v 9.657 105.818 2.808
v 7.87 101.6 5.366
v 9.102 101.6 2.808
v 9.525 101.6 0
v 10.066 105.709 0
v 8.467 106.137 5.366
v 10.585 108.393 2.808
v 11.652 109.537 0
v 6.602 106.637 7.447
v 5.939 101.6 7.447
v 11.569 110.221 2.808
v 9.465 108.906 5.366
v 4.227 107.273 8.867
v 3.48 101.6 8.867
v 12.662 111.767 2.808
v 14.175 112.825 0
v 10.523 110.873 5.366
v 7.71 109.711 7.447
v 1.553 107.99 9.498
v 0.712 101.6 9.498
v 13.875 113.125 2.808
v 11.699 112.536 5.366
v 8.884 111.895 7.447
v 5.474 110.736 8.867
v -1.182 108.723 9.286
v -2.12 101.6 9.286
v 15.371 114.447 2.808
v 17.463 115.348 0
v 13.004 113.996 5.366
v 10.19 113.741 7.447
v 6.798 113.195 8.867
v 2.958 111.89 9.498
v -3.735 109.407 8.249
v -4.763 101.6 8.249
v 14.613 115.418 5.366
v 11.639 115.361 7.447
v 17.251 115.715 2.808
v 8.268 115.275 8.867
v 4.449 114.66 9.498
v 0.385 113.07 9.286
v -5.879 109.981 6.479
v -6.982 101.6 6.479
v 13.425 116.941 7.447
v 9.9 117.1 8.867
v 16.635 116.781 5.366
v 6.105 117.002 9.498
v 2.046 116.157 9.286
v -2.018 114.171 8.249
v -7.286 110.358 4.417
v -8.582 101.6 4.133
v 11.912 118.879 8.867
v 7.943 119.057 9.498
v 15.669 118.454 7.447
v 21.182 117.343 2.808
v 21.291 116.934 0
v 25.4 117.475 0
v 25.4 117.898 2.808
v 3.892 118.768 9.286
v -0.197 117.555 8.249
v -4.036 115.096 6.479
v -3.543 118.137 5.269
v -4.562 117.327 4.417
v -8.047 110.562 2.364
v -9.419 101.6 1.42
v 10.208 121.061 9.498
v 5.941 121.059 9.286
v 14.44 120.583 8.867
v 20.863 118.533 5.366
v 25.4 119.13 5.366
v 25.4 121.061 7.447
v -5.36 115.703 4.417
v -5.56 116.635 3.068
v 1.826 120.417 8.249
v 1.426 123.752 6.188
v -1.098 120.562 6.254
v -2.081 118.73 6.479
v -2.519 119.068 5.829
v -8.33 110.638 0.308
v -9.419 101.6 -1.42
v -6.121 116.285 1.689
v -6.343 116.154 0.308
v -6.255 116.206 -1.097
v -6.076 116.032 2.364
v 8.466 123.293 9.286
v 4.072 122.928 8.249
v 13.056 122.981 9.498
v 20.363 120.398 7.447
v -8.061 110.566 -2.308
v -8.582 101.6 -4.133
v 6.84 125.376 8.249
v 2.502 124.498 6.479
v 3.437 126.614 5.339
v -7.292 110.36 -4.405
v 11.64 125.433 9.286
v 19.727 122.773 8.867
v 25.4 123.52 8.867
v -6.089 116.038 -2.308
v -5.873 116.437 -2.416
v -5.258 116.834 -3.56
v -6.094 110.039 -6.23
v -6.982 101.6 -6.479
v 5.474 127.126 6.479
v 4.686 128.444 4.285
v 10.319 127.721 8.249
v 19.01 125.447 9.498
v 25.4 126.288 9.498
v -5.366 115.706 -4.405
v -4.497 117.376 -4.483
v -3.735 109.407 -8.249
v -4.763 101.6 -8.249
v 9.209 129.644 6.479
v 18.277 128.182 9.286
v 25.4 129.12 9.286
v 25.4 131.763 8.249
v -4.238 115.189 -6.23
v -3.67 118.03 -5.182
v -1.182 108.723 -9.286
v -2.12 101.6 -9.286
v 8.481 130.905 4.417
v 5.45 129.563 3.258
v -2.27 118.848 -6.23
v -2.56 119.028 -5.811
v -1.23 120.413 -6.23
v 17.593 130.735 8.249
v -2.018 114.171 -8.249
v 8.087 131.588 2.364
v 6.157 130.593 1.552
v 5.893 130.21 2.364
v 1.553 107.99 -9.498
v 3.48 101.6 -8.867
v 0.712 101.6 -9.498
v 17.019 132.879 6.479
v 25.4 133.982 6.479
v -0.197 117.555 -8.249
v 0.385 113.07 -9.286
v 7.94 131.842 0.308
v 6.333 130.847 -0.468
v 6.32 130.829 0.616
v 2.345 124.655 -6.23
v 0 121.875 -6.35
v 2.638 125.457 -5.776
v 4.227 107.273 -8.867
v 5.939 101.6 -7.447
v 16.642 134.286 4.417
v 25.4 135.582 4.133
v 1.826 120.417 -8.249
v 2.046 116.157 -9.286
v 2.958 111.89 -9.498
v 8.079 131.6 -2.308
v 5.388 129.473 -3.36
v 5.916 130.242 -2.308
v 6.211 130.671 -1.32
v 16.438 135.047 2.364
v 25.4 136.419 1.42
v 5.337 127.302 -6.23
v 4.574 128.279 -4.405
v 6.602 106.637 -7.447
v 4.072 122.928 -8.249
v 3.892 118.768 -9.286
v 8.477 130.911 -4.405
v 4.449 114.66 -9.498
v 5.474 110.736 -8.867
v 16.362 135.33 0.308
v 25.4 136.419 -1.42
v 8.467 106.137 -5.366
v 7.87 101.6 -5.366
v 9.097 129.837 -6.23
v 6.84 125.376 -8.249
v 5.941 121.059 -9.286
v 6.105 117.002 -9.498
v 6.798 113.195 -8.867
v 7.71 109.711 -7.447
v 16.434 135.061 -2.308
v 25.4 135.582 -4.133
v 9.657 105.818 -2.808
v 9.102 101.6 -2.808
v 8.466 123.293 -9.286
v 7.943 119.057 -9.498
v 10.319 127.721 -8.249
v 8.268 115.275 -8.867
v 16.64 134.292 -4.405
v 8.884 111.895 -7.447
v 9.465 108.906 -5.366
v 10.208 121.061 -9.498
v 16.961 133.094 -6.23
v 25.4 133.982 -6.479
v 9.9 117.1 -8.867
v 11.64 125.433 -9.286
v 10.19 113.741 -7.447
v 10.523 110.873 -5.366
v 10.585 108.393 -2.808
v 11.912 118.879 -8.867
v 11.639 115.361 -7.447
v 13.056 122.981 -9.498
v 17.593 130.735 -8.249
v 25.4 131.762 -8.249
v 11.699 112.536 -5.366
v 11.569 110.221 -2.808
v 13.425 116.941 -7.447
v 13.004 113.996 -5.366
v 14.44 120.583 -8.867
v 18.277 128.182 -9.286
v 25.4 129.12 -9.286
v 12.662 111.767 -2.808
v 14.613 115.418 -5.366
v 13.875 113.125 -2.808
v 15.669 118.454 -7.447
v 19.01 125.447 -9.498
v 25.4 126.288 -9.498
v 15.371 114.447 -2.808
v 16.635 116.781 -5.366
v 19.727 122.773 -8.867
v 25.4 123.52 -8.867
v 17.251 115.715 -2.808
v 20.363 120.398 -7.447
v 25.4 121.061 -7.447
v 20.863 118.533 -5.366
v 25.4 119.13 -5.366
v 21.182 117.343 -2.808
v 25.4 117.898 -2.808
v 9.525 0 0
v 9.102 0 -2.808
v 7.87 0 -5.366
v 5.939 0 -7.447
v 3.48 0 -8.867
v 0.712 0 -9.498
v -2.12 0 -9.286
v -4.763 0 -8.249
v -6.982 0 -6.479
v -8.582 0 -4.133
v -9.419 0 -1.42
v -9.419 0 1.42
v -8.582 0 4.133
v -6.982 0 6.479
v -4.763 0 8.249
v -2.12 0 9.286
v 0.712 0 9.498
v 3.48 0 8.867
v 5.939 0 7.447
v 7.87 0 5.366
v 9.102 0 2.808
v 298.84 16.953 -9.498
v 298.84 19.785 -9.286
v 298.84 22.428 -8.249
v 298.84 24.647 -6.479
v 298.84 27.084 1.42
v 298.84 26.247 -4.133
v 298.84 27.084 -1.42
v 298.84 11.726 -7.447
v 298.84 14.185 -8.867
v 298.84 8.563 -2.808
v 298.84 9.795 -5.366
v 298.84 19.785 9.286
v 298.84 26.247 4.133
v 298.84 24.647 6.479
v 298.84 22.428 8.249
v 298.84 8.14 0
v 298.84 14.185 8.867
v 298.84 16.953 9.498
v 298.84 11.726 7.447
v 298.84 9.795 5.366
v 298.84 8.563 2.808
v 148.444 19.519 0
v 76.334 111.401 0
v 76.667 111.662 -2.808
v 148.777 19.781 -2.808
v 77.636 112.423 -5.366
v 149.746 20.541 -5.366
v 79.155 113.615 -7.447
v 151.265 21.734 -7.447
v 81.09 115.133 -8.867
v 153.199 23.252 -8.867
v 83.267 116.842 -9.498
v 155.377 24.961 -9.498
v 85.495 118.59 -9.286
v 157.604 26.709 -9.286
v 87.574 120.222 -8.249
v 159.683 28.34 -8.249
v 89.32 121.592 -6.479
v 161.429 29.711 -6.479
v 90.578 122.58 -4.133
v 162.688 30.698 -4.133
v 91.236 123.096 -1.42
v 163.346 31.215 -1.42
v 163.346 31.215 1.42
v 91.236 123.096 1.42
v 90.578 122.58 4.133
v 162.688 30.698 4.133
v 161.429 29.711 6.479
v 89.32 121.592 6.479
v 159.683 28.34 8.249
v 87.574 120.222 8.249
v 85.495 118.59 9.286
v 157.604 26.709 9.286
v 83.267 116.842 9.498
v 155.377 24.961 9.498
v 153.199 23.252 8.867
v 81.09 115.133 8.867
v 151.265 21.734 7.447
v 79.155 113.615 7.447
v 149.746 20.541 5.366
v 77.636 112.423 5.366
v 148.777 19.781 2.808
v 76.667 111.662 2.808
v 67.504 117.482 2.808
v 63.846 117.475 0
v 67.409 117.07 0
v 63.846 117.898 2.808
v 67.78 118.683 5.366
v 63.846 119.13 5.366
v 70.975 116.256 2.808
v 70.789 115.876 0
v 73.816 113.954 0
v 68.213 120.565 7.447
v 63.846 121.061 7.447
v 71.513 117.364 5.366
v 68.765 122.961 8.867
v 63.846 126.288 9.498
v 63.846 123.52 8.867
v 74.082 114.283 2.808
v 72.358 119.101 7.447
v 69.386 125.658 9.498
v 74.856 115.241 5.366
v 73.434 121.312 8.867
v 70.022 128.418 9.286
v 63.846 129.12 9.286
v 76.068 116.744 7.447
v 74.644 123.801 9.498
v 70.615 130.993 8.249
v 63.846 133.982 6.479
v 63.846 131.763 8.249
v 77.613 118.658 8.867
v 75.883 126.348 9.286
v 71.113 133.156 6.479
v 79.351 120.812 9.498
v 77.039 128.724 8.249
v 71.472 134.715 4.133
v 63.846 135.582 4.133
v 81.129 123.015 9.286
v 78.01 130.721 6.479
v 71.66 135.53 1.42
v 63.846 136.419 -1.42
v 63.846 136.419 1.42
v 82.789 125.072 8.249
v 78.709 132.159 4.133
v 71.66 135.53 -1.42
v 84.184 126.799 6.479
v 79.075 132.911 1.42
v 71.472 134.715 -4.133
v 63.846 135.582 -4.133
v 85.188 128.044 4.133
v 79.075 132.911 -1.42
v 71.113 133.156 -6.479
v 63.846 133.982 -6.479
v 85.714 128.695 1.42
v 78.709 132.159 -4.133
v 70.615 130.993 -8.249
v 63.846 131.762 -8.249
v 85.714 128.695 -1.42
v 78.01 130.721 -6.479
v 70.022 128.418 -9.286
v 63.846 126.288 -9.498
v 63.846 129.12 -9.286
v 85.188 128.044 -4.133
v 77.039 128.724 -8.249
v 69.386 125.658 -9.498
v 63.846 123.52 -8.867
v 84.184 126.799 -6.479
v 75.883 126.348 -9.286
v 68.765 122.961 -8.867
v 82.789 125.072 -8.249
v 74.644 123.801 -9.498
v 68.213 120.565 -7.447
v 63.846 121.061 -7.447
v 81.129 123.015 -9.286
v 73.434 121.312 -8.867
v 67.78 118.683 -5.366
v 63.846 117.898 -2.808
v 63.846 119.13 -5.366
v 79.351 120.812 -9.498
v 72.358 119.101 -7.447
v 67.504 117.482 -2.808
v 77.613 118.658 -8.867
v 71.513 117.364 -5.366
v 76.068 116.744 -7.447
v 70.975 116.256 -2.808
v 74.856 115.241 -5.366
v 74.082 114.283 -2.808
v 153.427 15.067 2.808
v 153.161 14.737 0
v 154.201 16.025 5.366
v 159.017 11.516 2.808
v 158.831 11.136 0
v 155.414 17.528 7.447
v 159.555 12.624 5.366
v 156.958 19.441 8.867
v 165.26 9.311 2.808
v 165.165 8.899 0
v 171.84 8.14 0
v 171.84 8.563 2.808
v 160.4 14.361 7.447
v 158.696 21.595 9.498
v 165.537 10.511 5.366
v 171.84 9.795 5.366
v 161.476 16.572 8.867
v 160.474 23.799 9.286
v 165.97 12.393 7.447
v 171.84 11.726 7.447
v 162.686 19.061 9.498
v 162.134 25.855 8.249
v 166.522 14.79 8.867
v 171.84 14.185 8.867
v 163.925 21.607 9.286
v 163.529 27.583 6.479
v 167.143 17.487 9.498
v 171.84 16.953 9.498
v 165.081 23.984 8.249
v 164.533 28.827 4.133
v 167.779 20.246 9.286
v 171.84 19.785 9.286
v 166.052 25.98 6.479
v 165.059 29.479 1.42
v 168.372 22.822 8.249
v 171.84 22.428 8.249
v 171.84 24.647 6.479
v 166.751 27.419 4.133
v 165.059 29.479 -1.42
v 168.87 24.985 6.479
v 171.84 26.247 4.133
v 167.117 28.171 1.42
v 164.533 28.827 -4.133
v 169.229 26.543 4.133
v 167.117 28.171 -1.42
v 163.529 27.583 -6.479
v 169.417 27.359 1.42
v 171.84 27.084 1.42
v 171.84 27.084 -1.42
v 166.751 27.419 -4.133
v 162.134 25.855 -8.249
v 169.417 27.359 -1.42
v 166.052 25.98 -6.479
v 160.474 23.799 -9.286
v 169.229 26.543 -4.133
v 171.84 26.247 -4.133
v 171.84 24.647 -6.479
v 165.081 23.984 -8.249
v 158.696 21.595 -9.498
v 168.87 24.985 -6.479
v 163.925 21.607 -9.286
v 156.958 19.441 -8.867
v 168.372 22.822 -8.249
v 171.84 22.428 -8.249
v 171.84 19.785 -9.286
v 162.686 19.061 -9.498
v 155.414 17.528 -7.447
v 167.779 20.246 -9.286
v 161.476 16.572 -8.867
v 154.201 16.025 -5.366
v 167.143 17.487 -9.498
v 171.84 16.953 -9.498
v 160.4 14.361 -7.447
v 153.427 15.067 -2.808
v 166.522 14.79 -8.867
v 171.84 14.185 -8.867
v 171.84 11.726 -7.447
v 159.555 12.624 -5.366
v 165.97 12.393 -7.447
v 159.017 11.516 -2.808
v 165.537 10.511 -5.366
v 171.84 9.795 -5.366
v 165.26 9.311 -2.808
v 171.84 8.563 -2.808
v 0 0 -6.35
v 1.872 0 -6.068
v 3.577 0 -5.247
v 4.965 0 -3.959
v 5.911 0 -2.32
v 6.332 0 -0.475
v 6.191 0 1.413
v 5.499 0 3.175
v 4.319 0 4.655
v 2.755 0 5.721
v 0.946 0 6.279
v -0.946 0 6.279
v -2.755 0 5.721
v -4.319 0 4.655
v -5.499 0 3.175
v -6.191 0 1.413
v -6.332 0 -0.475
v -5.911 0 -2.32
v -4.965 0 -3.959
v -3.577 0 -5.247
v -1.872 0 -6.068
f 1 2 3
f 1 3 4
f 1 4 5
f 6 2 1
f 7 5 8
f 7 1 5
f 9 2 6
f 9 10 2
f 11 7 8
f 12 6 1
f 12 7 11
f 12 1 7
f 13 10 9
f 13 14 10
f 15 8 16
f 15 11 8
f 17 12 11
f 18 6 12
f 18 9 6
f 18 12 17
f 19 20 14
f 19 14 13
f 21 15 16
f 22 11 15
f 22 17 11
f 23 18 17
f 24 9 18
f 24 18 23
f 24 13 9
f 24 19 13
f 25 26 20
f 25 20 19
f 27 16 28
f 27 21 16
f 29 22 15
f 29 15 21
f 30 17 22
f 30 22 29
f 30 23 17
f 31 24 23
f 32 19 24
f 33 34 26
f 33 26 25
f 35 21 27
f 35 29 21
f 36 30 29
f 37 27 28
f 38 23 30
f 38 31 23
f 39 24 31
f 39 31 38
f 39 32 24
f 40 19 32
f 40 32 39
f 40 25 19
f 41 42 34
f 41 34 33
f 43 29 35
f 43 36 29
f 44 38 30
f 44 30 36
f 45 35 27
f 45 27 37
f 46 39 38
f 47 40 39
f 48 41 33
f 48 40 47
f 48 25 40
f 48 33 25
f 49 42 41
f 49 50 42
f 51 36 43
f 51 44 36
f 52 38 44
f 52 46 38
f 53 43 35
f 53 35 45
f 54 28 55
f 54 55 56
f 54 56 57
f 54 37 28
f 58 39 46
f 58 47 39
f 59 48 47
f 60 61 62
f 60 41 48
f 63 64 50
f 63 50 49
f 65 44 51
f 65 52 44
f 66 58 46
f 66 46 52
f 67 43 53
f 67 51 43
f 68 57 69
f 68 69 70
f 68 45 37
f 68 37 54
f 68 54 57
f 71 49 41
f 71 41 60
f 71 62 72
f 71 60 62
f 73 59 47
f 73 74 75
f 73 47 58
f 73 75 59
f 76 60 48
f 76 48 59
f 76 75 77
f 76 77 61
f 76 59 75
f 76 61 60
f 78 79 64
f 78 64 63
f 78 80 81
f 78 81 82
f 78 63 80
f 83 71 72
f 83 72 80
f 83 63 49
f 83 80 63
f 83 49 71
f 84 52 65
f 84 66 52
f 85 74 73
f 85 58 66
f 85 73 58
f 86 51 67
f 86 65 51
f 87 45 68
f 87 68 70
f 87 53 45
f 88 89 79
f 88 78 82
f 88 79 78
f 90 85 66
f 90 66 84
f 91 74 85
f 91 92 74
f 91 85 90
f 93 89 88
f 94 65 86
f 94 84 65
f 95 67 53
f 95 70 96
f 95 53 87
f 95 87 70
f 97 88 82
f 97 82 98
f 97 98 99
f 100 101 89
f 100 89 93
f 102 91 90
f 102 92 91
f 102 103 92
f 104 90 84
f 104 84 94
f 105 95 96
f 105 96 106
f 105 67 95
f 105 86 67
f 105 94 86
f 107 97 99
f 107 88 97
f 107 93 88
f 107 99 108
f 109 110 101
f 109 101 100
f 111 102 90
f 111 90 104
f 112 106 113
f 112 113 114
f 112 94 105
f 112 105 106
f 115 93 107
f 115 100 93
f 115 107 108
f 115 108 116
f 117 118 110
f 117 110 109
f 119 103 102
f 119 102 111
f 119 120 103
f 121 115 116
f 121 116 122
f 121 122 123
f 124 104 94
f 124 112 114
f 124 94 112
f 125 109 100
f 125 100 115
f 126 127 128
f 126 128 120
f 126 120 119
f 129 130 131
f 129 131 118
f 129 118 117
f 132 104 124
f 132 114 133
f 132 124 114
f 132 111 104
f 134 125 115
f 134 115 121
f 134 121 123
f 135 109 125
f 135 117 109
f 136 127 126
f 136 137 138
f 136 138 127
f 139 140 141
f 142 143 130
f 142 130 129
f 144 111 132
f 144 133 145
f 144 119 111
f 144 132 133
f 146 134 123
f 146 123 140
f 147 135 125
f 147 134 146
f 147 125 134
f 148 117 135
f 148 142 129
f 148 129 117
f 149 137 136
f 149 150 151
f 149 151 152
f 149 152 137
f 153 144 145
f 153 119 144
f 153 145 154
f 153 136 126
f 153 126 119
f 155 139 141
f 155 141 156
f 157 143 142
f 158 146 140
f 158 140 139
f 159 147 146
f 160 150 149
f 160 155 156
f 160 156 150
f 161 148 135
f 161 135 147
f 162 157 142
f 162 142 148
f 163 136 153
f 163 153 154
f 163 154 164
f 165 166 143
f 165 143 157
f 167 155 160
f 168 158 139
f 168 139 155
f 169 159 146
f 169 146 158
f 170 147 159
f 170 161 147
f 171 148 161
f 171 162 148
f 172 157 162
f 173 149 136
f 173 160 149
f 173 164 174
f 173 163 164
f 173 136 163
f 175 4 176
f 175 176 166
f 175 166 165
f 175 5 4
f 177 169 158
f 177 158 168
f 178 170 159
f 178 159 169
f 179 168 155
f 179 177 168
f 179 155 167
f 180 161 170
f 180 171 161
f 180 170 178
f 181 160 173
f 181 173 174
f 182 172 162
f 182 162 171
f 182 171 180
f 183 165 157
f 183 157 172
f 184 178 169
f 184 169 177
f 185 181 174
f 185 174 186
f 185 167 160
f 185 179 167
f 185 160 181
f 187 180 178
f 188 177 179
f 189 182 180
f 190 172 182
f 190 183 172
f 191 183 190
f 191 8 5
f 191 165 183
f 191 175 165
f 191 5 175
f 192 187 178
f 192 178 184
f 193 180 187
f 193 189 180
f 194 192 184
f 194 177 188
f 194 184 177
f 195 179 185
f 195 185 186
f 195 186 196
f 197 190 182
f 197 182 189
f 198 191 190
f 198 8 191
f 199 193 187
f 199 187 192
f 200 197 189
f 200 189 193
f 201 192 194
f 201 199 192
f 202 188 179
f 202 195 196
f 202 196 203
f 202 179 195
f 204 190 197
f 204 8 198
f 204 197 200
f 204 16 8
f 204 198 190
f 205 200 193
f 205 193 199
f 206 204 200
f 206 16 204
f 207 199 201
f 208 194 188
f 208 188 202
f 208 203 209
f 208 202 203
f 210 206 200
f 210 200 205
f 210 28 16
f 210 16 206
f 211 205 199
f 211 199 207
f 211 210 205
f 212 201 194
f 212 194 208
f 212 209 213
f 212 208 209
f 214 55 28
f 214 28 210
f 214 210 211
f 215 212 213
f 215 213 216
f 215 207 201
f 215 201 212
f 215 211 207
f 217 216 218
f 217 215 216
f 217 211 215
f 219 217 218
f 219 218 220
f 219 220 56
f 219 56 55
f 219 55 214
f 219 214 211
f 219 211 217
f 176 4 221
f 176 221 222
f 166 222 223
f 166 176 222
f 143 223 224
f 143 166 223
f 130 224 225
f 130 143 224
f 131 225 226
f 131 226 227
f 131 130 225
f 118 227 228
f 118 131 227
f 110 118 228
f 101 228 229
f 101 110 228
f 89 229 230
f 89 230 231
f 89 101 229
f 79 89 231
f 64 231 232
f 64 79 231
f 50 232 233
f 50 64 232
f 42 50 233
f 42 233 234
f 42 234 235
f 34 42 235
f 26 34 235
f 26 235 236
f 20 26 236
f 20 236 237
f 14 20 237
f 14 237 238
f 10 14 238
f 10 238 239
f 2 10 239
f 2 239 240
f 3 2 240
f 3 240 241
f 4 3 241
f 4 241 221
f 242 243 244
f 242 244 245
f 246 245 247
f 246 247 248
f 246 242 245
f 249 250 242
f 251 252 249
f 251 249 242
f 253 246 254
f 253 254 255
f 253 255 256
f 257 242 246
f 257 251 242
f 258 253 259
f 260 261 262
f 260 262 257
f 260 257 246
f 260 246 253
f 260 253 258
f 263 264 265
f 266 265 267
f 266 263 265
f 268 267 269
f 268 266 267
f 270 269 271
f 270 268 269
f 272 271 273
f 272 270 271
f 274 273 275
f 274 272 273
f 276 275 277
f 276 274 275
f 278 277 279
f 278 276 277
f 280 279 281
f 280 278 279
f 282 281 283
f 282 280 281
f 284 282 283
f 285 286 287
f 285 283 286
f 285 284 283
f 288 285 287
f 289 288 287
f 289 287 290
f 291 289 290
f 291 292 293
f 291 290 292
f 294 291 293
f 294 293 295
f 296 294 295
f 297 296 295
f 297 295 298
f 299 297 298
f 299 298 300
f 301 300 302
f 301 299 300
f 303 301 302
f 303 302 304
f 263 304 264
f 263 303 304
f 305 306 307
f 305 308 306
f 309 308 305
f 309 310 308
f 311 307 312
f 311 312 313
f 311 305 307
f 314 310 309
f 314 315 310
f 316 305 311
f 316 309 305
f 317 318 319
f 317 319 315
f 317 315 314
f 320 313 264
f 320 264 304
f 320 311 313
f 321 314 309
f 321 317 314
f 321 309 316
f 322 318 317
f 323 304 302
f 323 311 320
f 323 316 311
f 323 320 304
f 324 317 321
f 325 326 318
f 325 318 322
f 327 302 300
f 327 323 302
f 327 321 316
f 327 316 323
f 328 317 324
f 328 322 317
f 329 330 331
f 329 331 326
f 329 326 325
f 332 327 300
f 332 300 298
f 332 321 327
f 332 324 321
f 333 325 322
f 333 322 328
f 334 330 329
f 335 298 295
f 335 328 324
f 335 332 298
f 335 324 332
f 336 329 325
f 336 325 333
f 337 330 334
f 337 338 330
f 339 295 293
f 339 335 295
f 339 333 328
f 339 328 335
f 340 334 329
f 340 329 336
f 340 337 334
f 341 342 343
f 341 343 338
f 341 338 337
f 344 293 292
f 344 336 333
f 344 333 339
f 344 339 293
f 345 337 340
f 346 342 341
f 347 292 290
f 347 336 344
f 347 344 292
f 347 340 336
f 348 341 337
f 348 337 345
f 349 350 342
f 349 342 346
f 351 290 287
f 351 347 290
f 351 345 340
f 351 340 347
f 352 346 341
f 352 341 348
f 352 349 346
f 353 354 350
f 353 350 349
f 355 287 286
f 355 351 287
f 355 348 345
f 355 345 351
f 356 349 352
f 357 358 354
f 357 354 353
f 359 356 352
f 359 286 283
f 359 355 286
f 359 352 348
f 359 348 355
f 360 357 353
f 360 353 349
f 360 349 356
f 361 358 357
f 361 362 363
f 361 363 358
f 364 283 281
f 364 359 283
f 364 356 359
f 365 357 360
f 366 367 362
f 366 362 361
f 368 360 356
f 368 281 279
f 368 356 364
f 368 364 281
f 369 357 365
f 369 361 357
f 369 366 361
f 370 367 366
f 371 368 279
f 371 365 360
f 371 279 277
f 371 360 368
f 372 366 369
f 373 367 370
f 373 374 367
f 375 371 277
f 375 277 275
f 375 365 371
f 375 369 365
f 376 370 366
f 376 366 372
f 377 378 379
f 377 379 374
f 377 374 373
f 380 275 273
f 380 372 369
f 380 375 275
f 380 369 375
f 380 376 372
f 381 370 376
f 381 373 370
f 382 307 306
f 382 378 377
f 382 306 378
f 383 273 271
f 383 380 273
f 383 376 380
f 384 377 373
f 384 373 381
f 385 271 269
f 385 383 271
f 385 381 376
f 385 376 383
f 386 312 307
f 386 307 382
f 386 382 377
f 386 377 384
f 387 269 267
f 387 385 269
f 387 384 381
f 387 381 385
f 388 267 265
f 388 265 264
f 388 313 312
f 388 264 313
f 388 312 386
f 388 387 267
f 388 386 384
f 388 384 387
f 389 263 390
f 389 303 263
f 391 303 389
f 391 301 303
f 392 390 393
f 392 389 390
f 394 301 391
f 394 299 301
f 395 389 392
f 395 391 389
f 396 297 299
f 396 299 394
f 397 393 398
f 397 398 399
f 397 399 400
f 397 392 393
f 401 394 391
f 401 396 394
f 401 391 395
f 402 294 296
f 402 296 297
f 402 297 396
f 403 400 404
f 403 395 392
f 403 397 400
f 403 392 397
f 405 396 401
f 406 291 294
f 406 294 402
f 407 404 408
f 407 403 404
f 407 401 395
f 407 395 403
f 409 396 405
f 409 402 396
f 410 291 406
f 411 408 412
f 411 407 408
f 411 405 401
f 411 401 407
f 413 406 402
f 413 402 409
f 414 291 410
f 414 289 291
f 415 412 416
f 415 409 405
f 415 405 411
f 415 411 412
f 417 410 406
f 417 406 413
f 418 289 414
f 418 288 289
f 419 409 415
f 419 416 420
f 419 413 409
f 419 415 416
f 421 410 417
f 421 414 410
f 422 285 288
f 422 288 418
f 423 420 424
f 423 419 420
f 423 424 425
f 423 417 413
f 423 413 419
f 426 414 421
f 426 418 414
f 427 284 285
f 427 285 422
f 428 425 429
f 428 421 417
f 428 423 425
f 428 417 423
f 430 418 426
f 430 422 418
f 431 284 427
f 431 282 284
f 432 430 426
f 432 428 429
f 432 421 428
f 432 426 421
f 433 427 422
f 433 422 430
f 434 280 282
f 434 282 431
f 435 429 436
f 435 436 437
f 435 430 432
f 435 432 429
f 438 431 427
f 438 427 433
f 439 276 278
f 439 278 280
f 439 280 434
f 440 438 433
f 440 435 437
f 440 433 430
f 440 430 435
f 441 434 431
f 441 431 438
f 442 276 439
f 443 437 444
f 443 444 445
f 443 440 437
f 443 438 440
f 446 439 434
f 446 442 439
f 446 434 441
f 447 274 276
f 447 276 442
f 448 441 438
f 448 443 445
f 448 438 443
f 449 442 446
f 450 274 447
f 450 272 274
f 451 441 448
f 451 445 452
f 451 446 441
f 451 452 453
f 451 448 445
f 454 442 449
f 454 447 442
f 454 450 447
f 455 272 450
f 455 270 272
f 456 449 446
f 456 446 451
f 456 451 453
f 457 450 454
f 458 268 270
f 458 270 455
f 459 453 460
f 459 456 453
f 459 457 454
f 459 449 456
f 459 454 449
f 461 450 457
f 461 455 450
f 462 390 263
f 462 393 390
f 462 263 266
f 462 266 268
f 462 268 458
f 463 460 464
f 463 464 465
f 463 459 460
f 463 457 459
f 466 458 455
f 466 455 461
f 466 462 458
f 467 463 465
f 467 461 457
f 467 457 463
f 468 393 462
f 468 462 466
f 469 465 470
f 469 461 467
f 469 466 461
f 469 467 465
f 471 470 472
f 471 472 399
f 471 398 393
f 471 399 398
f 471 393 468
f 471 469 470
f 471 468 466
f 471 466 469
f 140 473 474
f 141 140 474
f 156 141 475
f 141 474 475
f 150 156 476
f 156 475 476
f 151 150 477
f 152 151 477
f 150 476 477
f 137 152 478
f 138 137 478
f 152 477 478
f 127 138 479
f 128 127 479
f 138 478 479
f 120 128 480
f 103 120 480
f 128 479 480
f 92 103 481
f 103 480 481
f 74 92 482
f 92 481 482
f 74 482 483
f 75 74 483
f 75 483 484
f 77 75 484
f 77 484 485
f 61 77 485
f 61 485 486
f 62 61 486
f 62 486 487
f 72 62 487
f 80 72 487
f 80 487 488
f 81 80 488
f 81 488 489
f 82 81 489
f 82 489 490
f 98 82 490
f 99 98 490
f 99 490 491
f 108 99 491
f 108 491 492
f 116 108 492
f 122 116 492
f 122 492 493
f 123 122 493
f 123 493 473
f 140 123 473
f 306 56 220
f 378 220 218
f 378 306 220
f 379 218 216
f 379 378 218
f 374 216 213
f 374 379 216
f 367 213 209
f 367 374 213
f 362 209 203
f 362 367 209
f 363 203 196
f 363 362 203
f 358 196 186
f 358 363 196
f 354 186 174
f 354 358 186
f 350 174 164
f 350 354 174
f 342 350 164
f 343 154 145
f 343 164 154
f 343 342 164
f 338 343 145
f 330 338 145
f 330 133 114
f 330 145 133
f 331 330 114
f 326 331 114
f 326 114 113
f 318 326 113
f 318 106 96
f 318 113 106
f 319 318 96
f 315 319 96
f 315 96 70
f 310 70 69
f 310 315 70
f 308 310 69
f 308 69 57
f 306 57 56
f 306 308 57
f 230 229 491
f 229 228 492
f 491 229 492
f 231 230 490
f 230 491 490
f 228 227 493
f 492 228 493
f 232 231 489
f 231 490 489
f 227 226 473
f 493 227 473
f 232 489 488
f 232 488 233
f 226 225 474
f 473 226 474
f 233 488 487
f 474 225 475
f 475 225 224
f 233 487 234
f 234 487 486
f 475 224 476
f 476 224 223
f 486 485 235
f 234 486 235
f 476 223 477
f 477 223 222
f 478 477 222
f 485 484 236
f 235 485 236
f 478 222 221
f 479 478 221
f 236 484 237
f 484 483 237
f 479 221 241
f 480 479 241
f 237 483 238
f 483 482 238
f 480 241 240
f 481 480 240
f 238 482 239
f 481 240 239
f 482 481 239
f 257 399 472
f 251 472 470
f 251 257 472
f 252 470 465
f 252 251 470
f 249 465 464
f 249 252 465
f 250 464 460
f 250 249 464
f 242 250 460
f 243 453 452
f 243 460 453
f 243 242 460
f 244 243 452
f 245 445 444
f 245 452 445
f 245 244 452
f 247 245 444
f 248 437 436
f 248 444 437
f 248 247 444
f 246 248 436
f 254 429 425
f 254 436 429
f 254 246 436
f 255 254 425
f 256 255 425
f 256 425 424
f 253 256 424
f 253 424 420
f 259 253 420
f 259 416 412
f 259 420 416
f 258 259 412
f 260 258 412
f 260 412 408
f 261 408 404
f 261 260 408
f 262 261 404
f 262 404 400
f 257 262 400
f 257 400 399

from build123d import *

# Parameters (mm, degrees)
SKETCH2_R          = 9.525
SKETCH6_R          = 6.35
CUT_EXTRUDE1_DEPTH = 139.7


with BuildPart() as part:
    # Sweep1: sweep along a path in Sketch1
    with BuildLine(Plane.XY) as sweep1_path:
        Line((0, 0), (0, 101.6))
        ThreePointArc((0, 101.6), (7.439487758, 119.560512242), (25.4, 127))
        Line((25.4, 127), (63.845922056, 127))
        ThreePointArc((63.845922056, 127), (74.955603314, 124.441518827), (83.827181396, 117.281494672))
        Line((83.827181396, 117.281494672), (155.936708861, 25.4))
        ThreePointArc((155.936708861, 25.4), (162.997624279, 19.70131545), (171.839852681, 17.665012665))
        Line((171.839852681, 17.665012665), (298.839852681, 17.665012665))
    # Sketch2 → Sweep1 (sweep)
    with BuildSketch(Plane(origin=(0, 0, 0), x_dir=(1, 0, 0), z_dir=(0, 1, 0))):
        Circle(SKETCH2_R)
    sweep(path=sweep1_path.line)

    # Sketch6 → Cut-Extrude1 (cut)
    with BuildSketch(Plane.XZ):
        with Locations(Location((0, 0, 0), (0, 0, 270))):
            Circle(SKETCH6_R)
    extrude(amount=-CUT_EXTRUDE1_DEPTH, mode=Mode.SUBTRACT)


solid = part.part
